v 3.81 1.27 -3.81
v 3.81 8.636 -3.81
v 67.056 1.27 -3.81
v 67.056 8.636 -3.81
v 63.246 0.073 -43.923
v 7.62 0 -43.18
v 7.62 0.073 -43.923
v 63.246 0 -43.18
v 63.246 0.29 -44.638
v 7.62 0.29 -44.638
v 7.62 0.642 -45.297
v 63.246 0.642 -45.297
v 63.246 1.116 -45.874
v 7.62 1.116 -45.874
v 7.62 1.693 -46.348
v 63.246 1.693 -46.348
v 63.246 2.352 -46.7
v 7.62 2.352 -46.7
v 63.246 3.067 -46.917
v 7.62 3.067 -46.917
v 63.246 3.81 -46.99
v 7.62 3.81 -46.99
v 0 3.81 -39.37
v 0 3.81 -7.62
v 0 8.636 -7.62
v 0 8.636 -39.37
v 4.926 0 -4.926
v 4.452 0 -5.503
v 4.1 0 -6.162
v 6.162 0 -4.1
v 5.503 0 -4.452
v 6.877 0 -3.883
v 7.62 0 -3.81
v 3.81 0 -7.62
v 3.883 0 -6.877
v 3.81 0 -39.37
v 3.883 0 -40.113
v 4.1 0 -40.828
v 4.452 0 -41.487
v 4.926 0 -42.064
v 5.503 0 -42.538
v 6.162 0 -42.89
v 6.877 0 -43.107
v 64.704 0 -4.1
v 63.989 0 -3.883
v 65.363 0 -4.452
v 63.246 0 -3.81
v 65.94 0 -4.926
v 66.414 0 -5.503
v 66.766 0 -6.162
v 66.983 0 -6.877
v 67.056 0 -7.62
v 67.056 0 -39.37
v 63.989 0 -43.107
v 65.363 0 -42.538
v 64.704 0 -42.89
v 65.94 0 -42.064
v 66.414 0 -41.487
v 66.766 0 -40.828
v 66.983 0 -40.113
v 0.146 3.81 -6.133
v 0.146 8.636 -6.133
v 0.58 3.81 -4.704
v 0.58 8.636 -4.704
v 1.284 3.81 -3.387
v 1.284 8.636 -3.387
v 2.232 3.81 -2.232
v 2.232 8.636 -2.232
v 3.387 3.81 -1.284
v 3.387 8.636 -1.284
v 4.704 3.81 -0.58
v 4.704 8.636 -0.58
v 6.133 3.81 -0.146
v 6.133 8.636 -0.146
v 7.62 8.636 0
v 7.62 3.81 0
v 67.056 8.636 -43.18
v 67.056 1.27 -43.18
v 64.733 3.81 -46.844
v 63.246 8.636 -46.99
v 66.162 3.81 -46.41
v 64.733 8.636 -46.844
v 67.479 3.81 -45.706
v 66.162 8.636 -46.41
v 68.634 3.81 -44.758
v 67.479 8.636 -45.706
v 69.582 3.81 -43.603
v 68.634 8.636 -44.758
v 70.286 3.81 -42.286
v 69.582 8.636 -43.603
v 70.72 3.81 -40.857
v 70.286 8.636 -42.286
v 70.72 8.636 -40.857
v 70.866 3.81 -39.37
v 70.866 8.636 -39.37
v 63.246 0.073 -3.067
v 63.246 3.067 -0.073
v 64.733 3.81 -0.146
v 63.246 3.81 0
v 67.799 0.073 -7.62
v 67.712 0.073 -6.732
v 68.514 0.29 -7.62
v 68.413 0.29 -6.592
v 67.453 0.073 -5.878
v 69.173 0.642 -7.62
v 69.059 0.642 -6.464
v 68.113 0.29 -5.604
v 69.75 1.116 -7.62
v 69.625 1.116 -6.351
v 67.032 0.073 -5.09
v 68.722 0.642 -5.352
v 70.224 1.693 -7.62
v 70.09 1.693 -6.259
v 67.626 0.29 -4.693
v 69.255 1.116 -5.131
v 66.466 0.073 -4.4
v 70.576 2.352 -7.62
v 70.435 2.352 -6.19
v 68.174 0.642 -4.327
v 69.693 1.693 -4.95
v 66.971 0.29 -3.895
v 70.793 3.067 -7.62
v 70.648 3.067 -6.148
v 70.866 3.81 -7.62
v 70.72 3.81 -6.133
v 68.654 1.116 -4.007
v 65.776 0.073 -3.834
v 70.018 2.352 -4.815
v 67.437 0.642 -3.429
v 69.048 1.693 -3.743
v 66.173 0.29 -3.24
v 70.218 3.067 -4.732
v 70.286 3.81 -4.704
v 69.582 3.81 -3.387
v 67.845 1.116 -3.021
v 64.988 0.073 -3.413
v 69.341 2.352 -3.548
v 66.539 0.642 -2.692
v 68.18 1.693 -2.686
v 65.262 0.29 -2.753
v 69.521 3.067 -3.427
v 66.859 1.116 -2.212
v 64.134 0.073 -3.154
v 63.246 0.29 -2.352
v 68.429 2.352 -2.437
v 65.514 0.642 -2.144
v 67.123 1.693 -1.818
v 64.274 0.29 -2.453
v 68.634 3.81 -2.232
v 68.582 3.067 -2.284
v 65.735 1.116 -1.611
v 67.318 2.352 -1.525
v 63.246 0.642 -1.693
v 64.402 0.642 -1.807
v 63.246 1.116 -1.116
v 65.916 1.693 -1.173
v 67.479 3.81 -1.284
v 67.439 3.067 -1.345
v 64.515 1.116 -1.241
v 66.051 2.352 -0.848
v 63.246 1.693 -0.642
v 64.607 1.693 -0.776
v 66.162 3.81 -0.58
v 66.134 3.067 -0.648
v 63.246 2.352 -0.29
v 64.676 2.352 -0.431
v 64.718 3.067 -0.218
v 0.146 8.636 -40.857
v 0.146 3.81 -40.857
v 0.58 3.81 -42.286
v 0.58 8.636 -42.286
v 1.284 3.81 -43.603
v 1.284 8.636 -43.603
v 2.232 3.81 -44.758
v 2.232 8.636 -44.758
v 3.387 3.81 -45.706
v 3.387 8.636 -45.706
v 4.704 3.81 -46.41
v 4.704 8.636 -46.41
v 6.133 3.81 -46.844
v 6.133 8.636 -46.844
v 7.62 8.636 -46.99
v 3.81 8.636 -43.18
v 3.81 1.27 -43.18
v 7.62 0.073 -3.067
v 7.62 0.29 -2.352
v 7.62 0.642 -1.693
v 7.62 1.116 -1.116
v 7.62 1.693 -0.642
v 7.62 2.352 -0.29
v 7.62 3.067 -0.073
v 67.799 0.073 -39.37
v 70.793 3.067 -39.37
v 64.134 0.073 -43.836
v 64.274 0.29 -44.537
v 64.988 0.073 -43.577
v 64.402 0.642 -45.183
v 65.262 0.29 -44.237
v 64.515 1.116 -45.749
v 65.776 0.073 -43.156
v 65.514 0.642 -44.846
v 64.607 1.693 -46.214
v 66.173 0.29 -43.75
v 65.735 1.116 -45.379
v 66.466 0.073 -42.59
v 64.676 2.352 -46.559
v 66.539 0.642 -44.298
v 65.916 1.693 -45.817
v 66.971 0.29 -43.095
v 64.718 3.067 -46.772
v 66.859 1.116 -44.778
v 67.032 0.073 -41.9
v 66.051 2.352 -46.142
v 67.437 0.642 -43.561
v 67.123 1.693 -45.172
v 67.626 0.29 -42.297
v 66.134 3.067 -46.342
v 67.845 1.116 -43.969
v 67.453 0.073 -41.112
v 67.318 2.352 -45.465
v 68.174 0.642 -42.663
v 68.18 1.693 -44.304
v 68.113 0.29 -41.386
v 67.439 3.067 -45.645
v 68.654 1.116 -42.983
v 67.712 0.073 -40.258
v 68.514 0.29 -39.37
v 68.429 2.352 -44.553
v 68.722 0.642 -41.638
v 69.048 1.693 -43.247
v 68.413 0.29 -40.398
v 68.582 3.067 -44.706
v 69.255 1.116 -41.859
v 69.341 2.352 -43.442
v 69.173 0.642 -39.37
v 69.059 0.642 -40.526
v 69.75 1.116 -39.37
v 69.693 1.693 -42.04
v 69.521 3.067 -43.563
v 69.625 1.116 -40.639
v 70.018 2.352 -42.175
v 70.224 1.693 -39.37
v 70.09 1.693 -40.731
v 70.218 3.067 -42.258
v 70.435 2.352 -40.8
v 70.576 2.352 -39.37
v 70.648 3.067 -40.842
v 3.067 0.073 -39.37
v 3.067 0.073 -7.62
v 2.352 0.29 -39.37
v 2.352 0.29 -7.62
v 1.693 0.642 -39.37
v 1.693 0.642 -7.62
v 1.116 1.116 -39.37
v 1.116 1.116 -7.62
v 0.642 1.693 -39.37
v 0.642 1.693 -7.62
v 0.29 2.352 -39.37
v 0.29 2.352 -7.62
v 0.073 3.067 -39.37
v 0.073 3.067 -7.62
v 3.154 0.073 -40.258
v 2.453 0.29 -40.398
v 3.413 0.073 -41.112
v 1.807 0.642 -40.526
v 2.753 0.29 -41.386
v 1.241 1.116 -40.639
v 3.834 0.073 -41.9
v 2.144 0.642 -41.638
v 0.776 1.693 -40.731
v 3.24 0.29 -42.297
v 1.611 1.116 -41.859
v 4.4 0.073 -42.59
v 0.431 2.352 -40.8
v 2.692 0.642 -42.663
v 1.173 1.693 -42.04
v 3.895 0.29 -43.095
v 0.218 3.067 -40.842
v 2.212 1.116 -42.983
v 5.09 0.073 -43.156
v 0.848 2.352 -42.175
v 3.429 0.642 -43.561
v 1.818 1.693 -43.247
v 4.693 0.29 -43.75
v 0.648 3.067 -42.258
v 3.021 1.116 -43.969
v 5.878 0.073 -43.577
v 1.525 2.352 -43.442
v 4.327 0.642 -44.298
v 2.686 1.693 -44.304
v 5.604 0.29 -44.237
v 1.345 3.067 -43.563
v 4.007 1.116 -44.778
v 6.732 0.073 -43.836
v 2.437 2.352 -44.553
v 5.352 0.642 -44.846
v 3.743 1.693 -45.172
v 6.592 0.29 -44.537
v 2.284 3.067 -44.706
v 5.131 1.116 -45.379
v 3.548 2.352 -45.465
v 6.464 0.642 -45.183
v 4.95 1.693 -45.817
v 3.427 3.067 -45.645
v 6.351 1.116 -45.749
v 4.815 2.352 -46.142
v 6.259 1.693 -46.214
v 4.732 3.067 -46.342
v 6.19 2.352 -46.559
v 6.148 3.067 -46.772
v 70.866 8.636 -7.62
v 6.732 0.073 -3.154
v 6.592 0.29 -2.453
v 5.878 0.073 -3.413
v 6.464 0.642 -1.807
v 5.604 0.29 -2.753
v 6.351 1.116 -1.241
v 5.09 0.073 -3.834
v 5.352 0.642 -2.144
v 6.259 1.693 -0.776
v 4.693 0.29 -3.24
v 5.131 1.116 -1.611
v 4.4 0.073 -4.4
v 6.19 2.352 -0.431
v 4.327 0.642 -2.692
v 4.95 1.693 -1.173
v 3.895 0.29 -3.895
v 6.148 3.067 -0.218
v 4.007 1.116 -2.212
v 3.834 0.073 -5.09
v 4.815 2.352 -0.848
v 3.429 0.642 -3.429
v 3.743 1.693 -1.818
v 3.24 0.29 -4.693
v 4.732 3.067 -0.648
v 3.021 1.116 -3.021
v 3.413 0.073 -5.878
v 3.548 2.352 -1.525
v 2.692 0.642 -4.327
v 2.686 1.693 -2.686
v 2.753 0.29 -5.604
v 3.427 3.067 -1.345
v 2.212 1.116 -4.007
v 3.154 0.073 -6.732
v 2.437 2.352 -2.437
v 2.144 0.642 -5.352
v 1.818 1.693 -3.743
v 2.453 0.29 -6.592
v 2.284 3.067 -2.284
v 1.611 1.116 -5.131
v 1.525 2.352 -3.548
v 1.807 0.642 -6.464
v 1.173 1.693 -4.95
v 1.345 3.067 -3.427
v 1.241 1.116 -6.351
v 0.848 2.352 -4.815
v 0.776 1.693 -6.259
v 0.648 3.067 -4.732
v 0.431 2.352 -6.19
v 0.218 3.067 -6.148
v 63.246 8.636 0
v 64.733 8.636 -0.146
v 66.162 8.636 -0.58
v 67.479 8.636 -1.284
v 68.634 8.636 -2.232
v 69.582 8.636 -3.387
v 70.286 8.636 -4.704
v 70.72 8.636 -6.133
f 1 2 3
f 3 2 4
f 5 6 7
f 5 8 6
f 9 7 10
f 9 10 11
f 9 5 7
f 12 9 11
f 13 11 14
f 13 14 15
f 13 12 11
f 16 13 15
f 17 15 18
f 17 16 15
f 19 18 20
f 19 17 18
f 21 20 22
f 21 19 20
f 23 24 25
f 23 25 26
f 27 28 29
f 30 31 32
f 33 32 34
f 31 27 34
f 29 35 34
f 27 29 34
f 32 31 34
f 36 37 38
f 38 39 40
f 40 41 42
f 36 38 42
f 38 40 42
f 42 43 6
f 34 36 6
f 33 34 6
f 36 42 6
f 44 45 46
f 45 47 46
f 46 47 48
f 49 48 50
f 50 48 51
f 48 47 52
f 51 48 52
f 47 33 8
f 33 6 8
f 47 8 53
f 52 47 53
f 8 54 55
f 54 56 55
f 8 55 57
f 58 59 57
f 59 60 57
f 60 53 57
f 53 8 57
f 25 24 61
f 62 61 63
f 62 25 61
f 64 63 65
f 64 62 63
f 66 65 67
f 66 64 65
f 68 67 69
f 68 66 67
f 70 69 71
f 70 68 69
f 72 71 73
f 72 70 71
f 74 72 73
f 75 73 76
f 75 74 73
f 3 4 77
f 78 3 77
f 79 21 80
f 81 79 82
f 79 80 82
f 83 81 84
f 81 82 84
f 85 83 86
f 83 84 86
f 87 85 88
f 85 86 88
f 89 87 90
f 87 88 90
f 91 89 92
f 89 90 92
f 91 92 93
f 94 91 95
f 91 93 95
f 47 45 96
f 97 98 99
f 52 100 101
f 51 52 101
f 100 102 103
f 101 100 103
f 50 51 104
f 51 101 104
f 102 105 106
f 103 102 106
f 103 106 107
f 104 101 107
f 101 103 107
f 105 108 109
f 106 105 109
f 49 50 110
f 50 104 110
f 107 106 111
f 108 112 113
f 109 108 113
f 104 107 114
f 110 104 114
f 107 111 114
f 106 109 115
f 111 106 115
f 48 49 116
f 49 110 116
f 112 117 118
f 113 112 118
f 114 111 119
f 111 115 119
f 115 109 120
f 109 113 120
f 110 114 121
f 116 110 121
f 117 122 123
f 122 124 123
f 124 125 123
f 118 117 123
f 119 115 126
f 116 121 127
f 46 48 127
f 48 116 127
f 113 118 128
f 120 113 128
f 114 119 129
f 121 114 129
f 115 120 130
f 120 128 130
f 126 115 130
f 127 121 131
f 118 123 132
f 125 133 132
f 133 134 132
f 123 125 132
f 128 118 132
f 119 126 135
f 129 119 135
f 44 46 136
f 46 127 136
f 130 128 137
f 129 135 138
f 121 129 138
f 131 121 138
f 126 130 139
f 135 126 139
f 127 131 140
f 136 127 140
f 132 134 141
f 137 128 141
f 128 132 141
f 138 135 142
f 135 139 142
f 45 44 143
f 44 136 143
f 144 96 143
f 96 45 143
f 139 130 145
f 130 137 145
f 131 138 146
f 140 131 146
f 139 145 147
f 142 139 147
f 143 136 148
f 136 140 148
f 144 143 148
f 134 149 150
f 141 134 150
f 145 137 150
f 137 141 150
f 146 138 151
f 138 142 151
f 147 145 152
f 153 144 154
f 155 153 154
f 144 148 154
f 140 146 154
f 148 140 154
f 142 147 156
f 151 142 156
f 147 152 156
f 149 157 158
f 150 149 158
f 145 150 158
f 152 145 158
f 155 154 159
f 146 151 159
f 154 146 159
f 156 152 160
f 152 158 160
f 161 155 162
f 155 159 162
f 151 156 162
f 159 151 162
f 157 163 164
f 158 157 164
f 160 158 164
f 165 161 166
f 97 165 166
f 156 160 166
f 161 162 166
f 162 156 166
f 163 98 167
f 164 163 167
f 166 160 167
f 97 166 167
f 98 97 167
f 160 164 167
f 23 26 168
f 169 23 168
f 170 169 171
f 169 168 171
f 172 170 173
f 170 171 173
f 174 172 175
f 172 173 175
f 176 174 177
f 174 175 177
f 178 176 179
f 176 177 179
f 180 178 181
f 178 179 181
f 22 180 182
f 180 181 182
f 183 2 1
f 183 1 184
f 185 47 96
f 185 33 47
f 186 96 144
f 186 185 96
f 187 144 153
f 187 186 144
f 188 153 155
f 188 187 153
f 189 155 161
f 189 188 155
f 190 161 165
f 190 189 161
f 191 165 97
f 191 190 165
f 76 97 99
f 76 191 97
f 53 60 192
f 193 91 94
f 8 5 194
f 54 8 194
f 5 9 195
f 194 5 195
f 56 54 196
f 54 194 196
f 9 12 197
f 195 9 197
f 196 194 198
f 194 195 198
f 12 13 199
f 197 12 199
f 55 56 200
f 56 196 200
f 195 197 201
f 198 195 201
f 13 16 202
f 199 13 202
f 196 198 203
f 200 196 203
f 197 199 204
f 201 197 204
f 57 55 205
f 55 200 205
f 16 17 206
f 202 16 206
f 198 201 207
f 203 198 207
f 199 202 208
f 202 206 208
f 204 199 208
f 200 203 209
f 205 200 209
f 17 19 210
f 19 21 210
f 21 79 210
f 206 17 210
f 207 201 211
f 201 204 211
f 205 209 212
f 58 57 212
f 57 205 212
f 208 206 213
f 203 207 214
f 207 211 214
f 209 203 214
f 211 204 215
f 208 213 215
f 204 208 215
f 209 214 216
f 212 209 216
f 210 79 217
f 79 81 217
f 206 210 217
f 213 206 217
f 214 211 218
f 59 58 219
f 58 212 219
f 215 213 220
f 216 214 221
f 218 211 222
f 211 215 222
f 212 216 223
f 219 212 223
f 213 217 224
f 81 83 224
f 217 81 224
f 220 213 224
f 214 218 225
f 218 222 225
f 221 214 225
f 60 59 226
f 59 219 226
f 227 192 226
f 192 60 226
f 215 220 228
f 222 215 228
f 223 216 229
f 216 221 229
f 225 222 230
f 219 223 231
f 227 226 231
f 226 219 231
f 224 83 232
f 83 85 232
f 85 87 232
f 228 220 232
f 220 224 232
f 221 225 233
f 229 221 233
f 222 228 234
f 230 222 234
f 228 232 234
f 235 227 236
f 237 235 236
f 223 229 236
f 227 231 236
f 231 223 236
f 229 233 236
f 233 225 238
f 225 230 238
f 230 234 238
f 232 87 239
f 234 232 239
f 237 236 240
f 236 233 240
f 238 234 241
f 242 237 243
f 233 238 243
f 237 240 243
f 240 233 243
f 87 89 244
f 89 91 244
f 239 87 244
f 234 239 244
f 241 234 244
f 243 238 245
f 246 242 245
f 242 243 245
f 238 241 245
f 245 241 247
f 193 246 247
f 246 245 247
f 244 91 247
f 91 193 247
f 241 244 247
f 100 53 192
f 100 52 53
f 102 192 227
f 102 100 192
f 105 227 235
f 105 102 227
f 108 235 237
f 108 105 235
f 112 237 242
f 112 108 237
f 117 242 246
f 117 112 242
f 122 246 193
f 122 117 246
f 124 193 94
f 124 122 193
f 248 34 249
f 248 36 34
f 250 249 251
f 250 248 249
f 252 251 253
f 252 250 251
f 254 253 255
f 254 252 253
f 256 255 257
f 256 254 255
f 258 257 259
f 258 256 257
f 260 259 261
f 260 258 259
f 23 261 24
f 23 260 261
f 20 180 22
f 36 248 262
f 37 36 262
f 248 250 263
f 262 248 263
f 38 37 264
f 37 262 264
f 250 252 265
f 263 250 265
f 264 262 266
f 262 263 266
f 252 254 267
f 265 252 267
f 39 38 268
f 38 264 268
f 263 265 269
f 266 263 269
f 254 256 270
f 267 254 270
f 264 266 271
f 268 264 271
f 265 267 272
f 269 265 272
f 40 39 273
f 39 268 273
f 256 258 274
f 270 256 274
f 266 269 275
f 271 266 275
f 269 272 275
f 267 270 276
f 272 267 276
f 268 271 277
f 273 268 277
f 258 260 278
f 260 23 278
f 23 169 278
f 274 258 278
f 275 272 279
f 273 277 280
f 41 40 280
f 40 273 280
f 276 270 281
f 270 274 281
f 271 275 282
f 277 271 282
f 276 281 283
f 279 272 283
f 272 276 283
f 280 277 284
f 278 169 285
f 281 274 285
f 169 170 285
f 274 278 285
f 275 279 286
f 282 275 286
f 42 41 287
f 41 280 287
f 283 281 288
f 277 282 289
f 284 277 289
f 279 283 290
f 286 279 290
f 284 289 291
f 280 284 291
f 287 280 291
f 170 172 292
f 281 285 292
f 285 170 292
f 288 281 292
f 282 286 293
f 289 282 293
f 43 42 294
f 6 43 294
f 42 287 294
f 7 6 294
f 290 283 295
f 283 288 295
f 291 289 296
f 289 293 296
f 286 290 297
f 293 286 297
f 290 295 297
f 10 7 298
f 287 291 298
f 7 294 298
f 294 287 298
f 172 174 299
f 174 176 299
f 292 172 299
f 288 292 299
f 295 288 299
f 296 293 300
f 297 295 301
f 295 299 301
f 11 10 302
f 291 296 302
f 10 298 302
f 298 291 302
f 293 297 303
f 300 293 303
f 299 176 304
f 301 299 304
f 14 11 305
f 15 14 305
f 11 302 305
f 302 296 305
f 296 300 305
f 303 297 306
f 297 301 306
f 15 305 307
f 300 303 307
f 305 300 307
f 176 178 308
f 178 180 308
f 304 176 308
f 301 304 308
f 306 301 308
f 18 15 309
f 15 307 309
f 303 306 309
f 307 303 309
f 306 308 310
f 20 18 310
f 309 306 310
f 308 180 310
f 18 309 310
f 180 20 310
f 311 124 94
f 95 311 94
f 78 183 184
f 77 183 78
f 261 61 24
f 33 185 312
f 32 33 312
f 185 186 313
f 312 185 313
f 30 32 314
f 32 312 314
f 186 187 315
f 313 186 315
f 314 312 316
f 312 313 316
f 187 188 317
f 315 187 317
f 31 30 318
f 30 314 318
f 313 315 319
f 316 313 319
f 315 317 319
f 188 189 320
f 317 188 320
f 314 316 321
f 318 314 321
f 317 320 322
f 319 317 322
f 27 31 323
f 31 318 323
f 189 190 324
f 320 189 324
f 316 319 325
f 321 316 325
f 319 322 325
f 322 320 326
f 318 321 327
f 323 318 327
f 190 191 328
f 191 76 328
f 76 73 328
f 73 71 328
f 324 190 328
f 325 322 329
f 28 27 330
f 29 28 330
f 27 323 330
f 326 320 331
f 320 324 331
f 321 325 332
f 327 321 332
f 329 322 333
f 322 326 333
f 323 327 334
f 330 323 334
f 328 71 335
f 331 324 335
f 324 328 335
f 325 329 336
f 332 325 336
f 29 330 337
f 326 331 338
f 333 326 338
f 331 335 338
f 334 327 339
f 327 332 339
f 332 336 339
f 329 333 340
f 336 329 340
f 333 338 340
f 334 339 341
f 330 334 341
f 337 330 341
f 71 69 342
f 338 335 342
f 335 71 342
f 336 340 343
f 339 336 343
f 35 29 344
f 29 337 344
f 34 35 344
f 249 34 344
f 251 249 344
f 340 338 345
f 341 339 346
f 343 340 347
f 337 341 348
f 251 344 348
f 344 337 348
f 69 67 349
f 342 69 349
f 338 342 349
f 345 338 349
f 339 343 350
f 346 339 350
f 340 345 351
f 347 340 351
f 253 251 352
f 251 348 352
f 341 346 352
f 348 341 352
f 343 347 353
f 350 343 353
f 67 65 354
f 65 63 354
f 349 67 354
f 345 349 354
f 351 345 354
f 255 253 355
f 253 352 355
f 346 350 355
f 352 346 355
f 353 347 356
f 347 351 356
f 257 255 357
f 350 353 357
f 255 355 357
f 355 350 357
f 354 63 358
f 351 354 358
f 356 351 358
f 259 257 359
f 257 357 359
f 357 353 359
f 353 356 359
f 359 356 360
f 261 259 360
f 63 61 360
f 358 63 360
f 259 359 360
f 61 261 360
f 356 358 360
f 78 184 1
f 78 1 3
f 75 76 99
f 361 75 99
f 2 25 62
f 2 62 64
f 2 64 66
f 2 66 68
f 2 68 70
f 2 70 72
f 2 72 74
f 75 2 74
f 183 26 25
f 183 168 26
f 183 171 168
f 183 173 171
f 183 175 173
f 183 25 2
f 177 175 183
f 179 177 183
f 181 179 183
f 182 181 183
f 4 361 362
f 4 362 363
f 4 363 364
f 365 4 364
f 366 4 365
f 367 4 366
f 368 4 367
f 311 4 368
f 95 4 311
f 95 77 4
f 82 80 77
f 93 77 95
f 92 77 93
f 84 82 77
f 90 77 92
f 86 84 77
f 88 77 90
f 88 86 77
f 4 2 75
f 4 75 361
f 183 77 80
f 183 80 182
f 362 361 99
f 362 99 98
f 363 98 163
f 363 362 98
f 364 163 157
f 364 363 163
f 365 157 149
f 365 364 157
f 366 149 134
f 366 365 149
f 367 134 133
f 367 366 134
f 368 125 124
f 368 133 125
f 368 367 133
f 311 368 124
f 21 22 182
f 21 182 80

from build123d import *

# Parameters (mm, degrees)
SKETCH1_W           = 70.866
SKETCH1_H           = 46.99
BOSS_EXTRUDE1_DEPTH = 8.636
SKETCH2_W           = 63.246
SKETCH2_H           = 39.37
CUT_EXTRUDE1_DEPTH  = 7.366
FILLET2_R           = 7.62
FILLET3_R           = 3.81


with BuildPart() as part:
    # Sketch1 → Boss-Extrude1 (new body)
    with BuildSketch(Plane(origin=(0, 0, 0), x_dir=(1, 0, 0), z_dir=(0, 1, 0))):
        with Locations((35.433, 23.495)):
            Rectangle(SKETCH1_W, SKETCH1_H)
    extrude(amount=BOSS_EXTRUDE1_DEPTH)

    # Sketch2 → Cut-Extrude1 (cut)
    with BuildSketch(Plane(origin=(0, 8.636, 0), x_dir=(1, 0, 0), z_dir=(0, 1, 0))):
        with Locations((35.433, 23.495)):
            Rectangle(SKETCH2_W, SKETCH2_H)
    extrude(amount=-CUT_EXTRUDE1_DEPTH, mode=Mode.SUBTRACT)

    # Fillet2
    fillet2_edges = [part.edges().sort_by_distance(p)[0] for p in [
        (0, 4.318, -46.99),
        (70.866, 4.318, -46.99),
        (70.866, 4.318, 0),
        (0, 4.318, 0),
    ]]
    fillet(fillet2_edges, radius=FILLET2_R)

    # Fillet3
    fillet3_edges = [part.edges().sort_by_distance(p)[0] for p in [
        (35.433, 0, -46.99),
        (0, 0, -23.495),
        (70.866, 0, -23.495),
        (35.433, 0, 0),
        (2.231846327, 0, -44.758153673),
        (2.231846327, 0, -2.231846327),
        (68.634153673, 0, -2.231846327),
        (68.634153673, 0, -44.758153673),
    ]]
    fillet(fillet3_edges, radius=FILLET3_R)


solid = part.part
